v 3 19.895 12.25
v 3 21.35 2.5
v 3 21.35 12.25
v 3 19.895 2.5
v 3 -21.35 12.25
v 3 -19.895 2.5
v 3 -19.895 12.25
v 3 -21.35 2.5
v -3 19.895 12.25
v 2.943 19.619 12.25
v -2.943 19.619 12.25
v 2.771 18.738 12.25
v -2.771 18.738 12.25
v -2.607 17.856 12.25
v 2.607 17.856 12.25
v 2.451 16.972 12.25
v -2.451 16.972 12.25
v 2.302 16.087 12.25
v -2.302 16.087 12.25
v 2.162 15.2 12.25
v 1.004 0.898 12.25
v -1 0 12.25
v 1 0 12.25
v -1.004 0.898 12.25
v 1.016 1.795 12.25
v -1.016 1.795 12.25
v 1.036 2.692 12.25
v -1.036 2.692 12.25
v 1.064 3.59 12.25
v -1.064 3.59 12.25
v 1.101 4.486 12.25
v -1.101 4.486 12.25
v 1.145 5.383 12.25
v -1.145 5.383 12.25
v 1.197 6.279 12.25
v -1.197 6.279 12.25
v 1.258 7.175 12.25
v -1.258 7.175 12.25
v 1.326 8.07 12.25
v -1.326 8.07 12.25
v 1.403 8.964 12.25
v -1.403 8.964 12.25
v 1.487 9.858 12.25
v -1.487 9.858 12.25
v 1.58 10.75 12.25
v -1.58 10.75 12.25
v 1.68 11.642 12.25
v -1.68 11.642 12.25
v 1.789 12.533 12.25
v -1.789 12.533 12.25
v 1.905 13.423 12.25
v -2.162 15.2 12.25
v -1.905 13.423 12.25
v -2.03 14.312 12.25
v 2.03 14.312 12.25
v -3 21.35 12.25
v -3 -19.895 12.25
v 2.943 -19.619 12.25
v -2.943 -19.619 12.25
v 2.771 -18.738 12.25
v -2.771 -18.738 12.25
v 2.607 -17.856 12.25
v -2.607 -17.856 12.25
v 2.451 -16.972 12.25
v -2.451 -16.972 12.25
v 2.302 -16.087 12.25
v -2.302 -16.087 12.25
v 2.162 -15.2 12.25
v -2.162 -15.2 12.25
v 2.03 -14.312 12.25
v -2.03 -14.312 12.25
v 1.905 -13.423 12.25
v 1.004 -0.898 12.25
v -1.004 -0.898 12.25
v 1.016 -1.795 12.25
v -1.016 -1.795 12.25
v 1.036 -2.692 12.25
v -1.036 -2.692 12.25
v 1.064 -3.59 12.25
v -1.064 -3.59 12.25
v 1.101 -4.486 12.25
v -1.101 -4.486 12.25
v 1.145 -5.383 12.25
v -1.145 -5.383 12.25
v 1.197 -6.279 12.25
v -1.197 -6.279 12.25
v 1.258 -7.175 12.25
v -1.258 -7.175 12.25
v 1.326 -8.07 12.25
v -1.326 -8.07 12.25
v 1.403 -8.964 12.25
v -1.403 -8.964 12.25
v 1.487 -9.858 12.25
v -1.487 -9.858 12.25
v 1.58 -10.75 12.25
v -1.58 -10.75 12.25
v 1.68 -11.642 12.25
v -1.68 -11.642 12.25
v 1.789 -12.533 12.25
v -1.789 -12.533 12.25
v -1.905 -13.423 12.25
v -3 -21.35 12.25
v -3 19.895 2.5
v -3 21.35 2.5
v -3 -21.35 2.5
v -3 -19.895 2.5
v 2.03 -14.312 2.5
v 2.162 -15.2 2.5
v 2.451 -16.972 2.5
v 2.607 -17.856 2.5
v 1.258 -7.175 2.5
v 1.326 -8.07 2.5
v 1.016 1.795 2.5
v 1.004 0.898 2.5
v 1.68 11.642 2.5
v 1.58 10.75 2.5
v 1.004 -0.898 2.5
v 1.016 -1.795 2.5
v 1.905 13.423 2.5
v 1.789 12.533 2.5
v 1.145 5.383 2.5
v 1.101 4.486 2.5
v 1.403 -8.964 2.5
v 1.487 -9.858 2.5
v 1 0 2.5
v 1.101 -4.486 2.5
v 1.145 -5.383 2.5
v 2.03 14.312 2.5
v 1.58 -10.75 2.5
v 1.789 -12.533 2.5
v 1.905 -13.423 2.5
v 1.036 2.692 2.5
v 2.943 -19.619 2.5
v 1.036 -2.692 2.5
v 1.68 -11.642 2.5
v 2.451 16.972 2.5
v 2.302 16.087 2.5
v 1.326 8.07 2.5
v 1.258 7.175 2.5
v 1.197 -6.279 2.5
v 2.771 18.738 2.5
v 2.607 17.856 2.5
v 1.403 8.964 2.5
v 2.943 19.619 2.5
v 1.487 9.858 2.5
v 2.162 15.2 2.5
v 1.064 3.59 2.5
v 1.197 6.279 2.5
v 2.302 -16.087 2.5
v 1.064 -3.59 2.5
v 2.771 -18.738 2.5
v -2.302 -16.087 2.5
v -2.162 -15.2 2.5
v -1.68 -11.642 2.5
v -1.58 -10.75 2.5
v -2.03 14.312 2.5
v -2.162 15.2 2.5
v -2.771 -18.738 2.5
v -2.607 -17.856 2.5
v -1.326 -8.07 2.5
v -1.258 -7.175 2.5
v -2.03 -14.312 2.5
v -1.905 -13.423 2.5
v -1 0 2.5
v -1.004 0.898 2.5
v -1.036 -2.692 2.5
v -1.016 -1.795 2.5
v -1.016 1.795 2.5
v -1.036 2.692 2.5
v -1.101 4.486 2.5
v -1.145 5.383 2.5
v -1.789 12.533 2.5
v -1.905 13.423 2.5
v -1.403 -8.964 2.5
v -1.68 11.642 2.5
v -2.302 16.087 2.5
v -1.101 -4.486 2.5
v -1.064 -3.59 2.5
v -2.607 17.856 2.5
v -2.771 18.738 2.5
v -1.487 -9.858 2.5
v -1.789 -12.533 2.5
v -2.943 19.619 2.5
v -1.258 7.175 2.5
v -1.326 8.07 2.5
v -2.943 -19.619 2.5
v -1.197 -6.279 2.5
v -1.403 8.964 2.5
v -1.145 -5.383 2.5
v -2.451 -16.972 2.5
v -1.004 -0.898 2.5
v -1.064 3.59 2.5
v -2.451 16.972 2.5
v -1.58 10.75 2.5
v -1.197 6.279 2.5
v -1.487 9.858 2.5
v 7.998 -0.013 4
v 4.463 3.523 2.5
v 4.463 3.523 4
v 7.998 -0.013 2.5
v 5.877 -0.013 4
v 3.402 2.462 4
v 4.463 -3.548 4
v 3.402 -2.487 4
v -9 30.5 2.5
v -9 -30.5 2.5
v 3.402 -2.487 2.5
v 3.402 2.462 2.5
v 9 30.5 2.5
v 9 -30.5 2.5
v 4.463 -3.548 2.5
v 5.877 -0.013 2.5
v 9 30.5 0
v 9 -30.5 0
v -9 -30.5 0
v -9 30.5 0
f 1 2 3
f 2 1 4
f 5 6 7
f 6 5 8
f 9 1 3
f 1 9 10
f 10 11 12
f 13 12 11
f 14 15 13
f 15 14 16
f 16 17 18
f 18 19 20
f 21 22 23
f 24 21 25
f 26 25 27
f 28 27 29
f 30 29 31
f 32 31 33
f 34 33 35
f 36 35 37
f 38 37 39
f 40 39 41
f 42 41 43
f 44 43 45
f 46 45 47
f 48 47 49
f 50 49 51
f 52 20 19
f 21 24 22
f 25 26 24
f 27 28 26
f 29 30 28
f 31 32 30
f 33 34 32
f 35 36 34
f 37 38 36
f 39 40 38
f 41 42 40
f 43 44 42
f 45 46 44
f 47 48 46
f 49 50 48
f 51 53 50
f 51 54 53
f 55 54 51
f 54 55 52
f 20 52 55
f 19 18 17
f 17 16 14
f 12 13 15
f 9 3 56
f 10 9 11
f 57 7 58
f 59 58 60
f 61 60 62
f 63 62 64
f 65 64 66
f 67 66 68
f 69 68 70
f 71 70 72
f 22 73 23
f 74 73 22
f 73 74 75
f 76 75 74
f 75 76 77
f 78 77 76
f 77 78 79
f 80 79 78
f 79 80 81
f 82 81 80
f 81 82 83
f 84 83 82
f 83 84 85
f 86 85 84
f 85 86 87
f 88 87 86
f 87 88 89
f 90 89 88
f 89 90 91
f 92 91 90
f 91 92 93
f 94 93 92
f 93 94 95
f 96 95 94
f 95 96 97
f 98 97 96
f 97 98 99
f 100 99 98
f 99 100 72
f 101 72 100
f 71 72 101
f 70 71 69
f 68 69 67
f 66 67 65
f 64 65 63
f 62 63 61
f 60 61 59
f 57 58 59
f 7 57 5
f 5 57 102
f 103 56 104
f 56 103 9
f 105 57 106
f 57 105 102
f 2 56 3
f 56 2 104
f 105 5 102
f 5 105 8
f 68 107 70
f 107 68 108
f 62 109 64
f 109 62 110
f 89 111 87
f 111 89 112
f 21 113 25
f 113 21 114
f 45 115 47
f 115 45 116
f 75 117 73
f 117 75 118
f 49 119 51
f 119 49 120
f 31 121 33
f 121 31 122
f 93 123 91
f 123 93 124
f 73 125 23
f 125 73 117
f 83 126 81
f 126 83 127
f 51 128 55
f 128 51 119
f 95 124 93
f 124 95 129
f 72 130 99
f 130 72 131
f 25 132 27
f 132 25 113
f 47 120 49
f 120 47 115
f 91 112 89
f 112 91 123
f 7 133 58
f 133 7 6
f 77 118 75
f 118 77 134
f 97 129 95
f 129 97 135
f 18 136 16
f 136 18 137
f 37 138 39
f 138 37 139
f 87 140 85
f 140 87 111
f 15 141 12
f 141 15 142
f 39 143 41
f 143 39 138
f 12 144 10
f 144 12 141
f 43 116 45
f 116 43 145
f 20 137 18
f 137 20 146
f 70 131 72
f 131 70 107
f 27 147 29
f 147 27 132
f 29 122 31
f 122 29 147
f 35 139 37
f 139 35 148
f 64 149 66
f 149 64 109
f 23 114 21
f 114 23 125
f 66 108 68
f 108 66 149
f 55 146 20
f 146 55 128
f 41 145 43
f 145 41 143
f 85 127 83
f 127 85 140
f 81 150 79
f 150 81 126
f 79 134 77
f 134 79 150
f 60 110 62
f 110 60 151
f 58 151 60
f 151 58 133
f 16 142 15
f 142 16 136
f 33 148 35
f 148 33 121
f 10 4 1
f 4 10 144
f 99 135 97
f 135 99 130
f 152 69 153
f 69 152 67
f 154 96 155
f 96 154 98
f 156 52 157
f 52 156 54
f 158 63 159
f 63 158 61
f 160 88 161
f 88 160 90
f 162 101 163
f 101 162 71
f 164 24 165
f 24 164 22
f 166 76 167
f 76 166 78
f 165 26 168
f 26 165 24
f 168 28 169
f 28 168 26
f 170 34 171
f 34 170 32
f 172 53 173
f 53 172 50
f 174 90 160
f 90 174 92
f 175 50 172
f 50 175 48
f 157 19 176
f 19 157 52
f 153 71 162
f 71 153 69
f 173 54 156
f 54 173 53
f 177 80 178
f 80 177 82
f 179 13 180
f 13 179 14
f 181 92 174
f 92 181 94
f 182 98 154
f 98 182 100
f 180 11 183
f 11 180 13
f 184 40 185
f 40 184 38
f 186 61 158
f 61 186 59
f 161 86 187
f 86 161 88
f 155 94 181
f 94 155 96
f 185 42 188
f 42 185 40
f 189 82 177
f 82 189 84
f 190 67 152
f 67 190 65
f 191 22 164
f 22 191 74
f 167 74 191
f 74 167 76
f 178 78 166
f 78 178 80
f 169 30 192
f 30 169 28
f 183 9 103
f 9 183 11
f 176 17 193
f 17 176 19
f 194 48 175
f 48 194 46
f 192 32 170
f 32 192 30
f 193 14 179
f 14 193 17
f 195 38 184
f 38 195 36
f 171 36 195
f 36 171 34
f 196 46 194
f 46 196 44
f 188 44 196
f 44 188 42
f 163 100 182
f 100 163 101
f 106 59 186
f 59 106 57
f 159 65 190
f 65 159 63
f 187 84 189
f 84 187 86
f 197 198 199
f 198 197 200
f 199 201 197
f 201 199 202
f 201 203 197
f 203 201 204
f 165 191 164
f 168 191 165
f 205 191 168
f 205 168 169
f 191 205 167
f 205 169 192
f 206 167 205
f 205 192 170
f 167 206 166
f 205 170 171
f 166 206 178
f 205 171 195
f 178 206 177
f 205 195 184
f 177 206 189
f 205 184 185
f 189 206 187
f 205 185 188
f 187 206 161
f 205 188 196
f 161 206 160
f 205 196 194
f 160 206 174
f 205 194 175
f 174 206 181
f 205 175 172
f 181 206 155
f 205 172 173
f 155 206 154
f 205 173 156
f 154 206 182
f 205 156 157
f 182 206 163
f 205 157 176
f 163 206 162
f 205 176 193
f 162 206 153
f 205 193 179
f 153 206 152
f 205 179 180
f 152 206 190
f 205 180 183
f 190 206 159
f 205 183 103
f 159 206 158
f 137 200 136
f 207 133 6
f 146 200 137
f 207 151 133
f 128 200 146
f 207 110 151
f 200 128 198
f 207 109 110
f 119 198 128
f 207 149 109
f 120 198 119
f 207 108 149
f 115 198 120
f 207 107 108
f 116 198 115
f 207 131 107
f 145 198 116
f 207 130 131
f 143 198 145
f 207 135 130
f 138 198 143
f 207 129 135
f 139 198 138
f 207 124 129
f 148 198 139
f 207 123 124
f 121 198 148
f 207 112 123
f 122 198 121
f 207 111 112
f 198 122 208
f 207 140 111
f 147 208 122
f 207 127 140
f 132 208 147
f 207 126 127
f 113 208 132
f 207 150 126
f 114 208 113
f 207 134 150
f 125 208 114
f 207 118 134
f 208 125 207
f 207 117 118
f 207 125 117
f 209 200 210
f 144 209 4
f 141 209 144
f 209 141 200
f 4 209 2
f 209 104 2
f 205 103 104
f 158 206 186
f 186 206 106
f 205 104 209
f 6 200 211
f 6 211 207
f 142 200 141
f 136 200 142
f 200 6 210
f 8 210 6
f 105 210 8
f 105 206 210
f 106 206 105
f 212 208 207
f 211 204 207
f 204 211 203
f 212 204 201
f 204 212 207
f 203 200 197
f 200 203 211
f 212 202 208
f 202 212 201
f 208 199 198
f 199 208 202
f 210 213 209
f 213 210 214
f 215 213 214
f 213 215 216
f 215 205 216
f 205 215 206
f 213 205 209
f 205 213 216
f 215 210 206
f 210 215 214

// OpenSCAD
WIDTH 	= 61; // [0:200]
LENGTH 	= 18; // [0:200]

translate([0,0,1.25]) cube(size = [LENGTH,WIDTH,2.5], center = true);

translate([0,0,7.25]) {
	difference() {
		color("green") cube(size = [6,WIDTH-WIDTH*0.3,10], center = true);
		
		translate([101,0,0]) cylinder(h = 10.1, r = 100, $fn=700, center = true);
		translate([-101,0,0]) cylinder(h = 10.1, r = 100, $fn=700, center = true);
	}
}

translate([5.7,-1.25,3.25]) rotate([0,0,45]){
	color("red") cube([5, 1.5, 1.5], center = true);
	translate ([1.75,1.75,0]) color("red") cube([1.5, 5, 1.5], center = true);
}
